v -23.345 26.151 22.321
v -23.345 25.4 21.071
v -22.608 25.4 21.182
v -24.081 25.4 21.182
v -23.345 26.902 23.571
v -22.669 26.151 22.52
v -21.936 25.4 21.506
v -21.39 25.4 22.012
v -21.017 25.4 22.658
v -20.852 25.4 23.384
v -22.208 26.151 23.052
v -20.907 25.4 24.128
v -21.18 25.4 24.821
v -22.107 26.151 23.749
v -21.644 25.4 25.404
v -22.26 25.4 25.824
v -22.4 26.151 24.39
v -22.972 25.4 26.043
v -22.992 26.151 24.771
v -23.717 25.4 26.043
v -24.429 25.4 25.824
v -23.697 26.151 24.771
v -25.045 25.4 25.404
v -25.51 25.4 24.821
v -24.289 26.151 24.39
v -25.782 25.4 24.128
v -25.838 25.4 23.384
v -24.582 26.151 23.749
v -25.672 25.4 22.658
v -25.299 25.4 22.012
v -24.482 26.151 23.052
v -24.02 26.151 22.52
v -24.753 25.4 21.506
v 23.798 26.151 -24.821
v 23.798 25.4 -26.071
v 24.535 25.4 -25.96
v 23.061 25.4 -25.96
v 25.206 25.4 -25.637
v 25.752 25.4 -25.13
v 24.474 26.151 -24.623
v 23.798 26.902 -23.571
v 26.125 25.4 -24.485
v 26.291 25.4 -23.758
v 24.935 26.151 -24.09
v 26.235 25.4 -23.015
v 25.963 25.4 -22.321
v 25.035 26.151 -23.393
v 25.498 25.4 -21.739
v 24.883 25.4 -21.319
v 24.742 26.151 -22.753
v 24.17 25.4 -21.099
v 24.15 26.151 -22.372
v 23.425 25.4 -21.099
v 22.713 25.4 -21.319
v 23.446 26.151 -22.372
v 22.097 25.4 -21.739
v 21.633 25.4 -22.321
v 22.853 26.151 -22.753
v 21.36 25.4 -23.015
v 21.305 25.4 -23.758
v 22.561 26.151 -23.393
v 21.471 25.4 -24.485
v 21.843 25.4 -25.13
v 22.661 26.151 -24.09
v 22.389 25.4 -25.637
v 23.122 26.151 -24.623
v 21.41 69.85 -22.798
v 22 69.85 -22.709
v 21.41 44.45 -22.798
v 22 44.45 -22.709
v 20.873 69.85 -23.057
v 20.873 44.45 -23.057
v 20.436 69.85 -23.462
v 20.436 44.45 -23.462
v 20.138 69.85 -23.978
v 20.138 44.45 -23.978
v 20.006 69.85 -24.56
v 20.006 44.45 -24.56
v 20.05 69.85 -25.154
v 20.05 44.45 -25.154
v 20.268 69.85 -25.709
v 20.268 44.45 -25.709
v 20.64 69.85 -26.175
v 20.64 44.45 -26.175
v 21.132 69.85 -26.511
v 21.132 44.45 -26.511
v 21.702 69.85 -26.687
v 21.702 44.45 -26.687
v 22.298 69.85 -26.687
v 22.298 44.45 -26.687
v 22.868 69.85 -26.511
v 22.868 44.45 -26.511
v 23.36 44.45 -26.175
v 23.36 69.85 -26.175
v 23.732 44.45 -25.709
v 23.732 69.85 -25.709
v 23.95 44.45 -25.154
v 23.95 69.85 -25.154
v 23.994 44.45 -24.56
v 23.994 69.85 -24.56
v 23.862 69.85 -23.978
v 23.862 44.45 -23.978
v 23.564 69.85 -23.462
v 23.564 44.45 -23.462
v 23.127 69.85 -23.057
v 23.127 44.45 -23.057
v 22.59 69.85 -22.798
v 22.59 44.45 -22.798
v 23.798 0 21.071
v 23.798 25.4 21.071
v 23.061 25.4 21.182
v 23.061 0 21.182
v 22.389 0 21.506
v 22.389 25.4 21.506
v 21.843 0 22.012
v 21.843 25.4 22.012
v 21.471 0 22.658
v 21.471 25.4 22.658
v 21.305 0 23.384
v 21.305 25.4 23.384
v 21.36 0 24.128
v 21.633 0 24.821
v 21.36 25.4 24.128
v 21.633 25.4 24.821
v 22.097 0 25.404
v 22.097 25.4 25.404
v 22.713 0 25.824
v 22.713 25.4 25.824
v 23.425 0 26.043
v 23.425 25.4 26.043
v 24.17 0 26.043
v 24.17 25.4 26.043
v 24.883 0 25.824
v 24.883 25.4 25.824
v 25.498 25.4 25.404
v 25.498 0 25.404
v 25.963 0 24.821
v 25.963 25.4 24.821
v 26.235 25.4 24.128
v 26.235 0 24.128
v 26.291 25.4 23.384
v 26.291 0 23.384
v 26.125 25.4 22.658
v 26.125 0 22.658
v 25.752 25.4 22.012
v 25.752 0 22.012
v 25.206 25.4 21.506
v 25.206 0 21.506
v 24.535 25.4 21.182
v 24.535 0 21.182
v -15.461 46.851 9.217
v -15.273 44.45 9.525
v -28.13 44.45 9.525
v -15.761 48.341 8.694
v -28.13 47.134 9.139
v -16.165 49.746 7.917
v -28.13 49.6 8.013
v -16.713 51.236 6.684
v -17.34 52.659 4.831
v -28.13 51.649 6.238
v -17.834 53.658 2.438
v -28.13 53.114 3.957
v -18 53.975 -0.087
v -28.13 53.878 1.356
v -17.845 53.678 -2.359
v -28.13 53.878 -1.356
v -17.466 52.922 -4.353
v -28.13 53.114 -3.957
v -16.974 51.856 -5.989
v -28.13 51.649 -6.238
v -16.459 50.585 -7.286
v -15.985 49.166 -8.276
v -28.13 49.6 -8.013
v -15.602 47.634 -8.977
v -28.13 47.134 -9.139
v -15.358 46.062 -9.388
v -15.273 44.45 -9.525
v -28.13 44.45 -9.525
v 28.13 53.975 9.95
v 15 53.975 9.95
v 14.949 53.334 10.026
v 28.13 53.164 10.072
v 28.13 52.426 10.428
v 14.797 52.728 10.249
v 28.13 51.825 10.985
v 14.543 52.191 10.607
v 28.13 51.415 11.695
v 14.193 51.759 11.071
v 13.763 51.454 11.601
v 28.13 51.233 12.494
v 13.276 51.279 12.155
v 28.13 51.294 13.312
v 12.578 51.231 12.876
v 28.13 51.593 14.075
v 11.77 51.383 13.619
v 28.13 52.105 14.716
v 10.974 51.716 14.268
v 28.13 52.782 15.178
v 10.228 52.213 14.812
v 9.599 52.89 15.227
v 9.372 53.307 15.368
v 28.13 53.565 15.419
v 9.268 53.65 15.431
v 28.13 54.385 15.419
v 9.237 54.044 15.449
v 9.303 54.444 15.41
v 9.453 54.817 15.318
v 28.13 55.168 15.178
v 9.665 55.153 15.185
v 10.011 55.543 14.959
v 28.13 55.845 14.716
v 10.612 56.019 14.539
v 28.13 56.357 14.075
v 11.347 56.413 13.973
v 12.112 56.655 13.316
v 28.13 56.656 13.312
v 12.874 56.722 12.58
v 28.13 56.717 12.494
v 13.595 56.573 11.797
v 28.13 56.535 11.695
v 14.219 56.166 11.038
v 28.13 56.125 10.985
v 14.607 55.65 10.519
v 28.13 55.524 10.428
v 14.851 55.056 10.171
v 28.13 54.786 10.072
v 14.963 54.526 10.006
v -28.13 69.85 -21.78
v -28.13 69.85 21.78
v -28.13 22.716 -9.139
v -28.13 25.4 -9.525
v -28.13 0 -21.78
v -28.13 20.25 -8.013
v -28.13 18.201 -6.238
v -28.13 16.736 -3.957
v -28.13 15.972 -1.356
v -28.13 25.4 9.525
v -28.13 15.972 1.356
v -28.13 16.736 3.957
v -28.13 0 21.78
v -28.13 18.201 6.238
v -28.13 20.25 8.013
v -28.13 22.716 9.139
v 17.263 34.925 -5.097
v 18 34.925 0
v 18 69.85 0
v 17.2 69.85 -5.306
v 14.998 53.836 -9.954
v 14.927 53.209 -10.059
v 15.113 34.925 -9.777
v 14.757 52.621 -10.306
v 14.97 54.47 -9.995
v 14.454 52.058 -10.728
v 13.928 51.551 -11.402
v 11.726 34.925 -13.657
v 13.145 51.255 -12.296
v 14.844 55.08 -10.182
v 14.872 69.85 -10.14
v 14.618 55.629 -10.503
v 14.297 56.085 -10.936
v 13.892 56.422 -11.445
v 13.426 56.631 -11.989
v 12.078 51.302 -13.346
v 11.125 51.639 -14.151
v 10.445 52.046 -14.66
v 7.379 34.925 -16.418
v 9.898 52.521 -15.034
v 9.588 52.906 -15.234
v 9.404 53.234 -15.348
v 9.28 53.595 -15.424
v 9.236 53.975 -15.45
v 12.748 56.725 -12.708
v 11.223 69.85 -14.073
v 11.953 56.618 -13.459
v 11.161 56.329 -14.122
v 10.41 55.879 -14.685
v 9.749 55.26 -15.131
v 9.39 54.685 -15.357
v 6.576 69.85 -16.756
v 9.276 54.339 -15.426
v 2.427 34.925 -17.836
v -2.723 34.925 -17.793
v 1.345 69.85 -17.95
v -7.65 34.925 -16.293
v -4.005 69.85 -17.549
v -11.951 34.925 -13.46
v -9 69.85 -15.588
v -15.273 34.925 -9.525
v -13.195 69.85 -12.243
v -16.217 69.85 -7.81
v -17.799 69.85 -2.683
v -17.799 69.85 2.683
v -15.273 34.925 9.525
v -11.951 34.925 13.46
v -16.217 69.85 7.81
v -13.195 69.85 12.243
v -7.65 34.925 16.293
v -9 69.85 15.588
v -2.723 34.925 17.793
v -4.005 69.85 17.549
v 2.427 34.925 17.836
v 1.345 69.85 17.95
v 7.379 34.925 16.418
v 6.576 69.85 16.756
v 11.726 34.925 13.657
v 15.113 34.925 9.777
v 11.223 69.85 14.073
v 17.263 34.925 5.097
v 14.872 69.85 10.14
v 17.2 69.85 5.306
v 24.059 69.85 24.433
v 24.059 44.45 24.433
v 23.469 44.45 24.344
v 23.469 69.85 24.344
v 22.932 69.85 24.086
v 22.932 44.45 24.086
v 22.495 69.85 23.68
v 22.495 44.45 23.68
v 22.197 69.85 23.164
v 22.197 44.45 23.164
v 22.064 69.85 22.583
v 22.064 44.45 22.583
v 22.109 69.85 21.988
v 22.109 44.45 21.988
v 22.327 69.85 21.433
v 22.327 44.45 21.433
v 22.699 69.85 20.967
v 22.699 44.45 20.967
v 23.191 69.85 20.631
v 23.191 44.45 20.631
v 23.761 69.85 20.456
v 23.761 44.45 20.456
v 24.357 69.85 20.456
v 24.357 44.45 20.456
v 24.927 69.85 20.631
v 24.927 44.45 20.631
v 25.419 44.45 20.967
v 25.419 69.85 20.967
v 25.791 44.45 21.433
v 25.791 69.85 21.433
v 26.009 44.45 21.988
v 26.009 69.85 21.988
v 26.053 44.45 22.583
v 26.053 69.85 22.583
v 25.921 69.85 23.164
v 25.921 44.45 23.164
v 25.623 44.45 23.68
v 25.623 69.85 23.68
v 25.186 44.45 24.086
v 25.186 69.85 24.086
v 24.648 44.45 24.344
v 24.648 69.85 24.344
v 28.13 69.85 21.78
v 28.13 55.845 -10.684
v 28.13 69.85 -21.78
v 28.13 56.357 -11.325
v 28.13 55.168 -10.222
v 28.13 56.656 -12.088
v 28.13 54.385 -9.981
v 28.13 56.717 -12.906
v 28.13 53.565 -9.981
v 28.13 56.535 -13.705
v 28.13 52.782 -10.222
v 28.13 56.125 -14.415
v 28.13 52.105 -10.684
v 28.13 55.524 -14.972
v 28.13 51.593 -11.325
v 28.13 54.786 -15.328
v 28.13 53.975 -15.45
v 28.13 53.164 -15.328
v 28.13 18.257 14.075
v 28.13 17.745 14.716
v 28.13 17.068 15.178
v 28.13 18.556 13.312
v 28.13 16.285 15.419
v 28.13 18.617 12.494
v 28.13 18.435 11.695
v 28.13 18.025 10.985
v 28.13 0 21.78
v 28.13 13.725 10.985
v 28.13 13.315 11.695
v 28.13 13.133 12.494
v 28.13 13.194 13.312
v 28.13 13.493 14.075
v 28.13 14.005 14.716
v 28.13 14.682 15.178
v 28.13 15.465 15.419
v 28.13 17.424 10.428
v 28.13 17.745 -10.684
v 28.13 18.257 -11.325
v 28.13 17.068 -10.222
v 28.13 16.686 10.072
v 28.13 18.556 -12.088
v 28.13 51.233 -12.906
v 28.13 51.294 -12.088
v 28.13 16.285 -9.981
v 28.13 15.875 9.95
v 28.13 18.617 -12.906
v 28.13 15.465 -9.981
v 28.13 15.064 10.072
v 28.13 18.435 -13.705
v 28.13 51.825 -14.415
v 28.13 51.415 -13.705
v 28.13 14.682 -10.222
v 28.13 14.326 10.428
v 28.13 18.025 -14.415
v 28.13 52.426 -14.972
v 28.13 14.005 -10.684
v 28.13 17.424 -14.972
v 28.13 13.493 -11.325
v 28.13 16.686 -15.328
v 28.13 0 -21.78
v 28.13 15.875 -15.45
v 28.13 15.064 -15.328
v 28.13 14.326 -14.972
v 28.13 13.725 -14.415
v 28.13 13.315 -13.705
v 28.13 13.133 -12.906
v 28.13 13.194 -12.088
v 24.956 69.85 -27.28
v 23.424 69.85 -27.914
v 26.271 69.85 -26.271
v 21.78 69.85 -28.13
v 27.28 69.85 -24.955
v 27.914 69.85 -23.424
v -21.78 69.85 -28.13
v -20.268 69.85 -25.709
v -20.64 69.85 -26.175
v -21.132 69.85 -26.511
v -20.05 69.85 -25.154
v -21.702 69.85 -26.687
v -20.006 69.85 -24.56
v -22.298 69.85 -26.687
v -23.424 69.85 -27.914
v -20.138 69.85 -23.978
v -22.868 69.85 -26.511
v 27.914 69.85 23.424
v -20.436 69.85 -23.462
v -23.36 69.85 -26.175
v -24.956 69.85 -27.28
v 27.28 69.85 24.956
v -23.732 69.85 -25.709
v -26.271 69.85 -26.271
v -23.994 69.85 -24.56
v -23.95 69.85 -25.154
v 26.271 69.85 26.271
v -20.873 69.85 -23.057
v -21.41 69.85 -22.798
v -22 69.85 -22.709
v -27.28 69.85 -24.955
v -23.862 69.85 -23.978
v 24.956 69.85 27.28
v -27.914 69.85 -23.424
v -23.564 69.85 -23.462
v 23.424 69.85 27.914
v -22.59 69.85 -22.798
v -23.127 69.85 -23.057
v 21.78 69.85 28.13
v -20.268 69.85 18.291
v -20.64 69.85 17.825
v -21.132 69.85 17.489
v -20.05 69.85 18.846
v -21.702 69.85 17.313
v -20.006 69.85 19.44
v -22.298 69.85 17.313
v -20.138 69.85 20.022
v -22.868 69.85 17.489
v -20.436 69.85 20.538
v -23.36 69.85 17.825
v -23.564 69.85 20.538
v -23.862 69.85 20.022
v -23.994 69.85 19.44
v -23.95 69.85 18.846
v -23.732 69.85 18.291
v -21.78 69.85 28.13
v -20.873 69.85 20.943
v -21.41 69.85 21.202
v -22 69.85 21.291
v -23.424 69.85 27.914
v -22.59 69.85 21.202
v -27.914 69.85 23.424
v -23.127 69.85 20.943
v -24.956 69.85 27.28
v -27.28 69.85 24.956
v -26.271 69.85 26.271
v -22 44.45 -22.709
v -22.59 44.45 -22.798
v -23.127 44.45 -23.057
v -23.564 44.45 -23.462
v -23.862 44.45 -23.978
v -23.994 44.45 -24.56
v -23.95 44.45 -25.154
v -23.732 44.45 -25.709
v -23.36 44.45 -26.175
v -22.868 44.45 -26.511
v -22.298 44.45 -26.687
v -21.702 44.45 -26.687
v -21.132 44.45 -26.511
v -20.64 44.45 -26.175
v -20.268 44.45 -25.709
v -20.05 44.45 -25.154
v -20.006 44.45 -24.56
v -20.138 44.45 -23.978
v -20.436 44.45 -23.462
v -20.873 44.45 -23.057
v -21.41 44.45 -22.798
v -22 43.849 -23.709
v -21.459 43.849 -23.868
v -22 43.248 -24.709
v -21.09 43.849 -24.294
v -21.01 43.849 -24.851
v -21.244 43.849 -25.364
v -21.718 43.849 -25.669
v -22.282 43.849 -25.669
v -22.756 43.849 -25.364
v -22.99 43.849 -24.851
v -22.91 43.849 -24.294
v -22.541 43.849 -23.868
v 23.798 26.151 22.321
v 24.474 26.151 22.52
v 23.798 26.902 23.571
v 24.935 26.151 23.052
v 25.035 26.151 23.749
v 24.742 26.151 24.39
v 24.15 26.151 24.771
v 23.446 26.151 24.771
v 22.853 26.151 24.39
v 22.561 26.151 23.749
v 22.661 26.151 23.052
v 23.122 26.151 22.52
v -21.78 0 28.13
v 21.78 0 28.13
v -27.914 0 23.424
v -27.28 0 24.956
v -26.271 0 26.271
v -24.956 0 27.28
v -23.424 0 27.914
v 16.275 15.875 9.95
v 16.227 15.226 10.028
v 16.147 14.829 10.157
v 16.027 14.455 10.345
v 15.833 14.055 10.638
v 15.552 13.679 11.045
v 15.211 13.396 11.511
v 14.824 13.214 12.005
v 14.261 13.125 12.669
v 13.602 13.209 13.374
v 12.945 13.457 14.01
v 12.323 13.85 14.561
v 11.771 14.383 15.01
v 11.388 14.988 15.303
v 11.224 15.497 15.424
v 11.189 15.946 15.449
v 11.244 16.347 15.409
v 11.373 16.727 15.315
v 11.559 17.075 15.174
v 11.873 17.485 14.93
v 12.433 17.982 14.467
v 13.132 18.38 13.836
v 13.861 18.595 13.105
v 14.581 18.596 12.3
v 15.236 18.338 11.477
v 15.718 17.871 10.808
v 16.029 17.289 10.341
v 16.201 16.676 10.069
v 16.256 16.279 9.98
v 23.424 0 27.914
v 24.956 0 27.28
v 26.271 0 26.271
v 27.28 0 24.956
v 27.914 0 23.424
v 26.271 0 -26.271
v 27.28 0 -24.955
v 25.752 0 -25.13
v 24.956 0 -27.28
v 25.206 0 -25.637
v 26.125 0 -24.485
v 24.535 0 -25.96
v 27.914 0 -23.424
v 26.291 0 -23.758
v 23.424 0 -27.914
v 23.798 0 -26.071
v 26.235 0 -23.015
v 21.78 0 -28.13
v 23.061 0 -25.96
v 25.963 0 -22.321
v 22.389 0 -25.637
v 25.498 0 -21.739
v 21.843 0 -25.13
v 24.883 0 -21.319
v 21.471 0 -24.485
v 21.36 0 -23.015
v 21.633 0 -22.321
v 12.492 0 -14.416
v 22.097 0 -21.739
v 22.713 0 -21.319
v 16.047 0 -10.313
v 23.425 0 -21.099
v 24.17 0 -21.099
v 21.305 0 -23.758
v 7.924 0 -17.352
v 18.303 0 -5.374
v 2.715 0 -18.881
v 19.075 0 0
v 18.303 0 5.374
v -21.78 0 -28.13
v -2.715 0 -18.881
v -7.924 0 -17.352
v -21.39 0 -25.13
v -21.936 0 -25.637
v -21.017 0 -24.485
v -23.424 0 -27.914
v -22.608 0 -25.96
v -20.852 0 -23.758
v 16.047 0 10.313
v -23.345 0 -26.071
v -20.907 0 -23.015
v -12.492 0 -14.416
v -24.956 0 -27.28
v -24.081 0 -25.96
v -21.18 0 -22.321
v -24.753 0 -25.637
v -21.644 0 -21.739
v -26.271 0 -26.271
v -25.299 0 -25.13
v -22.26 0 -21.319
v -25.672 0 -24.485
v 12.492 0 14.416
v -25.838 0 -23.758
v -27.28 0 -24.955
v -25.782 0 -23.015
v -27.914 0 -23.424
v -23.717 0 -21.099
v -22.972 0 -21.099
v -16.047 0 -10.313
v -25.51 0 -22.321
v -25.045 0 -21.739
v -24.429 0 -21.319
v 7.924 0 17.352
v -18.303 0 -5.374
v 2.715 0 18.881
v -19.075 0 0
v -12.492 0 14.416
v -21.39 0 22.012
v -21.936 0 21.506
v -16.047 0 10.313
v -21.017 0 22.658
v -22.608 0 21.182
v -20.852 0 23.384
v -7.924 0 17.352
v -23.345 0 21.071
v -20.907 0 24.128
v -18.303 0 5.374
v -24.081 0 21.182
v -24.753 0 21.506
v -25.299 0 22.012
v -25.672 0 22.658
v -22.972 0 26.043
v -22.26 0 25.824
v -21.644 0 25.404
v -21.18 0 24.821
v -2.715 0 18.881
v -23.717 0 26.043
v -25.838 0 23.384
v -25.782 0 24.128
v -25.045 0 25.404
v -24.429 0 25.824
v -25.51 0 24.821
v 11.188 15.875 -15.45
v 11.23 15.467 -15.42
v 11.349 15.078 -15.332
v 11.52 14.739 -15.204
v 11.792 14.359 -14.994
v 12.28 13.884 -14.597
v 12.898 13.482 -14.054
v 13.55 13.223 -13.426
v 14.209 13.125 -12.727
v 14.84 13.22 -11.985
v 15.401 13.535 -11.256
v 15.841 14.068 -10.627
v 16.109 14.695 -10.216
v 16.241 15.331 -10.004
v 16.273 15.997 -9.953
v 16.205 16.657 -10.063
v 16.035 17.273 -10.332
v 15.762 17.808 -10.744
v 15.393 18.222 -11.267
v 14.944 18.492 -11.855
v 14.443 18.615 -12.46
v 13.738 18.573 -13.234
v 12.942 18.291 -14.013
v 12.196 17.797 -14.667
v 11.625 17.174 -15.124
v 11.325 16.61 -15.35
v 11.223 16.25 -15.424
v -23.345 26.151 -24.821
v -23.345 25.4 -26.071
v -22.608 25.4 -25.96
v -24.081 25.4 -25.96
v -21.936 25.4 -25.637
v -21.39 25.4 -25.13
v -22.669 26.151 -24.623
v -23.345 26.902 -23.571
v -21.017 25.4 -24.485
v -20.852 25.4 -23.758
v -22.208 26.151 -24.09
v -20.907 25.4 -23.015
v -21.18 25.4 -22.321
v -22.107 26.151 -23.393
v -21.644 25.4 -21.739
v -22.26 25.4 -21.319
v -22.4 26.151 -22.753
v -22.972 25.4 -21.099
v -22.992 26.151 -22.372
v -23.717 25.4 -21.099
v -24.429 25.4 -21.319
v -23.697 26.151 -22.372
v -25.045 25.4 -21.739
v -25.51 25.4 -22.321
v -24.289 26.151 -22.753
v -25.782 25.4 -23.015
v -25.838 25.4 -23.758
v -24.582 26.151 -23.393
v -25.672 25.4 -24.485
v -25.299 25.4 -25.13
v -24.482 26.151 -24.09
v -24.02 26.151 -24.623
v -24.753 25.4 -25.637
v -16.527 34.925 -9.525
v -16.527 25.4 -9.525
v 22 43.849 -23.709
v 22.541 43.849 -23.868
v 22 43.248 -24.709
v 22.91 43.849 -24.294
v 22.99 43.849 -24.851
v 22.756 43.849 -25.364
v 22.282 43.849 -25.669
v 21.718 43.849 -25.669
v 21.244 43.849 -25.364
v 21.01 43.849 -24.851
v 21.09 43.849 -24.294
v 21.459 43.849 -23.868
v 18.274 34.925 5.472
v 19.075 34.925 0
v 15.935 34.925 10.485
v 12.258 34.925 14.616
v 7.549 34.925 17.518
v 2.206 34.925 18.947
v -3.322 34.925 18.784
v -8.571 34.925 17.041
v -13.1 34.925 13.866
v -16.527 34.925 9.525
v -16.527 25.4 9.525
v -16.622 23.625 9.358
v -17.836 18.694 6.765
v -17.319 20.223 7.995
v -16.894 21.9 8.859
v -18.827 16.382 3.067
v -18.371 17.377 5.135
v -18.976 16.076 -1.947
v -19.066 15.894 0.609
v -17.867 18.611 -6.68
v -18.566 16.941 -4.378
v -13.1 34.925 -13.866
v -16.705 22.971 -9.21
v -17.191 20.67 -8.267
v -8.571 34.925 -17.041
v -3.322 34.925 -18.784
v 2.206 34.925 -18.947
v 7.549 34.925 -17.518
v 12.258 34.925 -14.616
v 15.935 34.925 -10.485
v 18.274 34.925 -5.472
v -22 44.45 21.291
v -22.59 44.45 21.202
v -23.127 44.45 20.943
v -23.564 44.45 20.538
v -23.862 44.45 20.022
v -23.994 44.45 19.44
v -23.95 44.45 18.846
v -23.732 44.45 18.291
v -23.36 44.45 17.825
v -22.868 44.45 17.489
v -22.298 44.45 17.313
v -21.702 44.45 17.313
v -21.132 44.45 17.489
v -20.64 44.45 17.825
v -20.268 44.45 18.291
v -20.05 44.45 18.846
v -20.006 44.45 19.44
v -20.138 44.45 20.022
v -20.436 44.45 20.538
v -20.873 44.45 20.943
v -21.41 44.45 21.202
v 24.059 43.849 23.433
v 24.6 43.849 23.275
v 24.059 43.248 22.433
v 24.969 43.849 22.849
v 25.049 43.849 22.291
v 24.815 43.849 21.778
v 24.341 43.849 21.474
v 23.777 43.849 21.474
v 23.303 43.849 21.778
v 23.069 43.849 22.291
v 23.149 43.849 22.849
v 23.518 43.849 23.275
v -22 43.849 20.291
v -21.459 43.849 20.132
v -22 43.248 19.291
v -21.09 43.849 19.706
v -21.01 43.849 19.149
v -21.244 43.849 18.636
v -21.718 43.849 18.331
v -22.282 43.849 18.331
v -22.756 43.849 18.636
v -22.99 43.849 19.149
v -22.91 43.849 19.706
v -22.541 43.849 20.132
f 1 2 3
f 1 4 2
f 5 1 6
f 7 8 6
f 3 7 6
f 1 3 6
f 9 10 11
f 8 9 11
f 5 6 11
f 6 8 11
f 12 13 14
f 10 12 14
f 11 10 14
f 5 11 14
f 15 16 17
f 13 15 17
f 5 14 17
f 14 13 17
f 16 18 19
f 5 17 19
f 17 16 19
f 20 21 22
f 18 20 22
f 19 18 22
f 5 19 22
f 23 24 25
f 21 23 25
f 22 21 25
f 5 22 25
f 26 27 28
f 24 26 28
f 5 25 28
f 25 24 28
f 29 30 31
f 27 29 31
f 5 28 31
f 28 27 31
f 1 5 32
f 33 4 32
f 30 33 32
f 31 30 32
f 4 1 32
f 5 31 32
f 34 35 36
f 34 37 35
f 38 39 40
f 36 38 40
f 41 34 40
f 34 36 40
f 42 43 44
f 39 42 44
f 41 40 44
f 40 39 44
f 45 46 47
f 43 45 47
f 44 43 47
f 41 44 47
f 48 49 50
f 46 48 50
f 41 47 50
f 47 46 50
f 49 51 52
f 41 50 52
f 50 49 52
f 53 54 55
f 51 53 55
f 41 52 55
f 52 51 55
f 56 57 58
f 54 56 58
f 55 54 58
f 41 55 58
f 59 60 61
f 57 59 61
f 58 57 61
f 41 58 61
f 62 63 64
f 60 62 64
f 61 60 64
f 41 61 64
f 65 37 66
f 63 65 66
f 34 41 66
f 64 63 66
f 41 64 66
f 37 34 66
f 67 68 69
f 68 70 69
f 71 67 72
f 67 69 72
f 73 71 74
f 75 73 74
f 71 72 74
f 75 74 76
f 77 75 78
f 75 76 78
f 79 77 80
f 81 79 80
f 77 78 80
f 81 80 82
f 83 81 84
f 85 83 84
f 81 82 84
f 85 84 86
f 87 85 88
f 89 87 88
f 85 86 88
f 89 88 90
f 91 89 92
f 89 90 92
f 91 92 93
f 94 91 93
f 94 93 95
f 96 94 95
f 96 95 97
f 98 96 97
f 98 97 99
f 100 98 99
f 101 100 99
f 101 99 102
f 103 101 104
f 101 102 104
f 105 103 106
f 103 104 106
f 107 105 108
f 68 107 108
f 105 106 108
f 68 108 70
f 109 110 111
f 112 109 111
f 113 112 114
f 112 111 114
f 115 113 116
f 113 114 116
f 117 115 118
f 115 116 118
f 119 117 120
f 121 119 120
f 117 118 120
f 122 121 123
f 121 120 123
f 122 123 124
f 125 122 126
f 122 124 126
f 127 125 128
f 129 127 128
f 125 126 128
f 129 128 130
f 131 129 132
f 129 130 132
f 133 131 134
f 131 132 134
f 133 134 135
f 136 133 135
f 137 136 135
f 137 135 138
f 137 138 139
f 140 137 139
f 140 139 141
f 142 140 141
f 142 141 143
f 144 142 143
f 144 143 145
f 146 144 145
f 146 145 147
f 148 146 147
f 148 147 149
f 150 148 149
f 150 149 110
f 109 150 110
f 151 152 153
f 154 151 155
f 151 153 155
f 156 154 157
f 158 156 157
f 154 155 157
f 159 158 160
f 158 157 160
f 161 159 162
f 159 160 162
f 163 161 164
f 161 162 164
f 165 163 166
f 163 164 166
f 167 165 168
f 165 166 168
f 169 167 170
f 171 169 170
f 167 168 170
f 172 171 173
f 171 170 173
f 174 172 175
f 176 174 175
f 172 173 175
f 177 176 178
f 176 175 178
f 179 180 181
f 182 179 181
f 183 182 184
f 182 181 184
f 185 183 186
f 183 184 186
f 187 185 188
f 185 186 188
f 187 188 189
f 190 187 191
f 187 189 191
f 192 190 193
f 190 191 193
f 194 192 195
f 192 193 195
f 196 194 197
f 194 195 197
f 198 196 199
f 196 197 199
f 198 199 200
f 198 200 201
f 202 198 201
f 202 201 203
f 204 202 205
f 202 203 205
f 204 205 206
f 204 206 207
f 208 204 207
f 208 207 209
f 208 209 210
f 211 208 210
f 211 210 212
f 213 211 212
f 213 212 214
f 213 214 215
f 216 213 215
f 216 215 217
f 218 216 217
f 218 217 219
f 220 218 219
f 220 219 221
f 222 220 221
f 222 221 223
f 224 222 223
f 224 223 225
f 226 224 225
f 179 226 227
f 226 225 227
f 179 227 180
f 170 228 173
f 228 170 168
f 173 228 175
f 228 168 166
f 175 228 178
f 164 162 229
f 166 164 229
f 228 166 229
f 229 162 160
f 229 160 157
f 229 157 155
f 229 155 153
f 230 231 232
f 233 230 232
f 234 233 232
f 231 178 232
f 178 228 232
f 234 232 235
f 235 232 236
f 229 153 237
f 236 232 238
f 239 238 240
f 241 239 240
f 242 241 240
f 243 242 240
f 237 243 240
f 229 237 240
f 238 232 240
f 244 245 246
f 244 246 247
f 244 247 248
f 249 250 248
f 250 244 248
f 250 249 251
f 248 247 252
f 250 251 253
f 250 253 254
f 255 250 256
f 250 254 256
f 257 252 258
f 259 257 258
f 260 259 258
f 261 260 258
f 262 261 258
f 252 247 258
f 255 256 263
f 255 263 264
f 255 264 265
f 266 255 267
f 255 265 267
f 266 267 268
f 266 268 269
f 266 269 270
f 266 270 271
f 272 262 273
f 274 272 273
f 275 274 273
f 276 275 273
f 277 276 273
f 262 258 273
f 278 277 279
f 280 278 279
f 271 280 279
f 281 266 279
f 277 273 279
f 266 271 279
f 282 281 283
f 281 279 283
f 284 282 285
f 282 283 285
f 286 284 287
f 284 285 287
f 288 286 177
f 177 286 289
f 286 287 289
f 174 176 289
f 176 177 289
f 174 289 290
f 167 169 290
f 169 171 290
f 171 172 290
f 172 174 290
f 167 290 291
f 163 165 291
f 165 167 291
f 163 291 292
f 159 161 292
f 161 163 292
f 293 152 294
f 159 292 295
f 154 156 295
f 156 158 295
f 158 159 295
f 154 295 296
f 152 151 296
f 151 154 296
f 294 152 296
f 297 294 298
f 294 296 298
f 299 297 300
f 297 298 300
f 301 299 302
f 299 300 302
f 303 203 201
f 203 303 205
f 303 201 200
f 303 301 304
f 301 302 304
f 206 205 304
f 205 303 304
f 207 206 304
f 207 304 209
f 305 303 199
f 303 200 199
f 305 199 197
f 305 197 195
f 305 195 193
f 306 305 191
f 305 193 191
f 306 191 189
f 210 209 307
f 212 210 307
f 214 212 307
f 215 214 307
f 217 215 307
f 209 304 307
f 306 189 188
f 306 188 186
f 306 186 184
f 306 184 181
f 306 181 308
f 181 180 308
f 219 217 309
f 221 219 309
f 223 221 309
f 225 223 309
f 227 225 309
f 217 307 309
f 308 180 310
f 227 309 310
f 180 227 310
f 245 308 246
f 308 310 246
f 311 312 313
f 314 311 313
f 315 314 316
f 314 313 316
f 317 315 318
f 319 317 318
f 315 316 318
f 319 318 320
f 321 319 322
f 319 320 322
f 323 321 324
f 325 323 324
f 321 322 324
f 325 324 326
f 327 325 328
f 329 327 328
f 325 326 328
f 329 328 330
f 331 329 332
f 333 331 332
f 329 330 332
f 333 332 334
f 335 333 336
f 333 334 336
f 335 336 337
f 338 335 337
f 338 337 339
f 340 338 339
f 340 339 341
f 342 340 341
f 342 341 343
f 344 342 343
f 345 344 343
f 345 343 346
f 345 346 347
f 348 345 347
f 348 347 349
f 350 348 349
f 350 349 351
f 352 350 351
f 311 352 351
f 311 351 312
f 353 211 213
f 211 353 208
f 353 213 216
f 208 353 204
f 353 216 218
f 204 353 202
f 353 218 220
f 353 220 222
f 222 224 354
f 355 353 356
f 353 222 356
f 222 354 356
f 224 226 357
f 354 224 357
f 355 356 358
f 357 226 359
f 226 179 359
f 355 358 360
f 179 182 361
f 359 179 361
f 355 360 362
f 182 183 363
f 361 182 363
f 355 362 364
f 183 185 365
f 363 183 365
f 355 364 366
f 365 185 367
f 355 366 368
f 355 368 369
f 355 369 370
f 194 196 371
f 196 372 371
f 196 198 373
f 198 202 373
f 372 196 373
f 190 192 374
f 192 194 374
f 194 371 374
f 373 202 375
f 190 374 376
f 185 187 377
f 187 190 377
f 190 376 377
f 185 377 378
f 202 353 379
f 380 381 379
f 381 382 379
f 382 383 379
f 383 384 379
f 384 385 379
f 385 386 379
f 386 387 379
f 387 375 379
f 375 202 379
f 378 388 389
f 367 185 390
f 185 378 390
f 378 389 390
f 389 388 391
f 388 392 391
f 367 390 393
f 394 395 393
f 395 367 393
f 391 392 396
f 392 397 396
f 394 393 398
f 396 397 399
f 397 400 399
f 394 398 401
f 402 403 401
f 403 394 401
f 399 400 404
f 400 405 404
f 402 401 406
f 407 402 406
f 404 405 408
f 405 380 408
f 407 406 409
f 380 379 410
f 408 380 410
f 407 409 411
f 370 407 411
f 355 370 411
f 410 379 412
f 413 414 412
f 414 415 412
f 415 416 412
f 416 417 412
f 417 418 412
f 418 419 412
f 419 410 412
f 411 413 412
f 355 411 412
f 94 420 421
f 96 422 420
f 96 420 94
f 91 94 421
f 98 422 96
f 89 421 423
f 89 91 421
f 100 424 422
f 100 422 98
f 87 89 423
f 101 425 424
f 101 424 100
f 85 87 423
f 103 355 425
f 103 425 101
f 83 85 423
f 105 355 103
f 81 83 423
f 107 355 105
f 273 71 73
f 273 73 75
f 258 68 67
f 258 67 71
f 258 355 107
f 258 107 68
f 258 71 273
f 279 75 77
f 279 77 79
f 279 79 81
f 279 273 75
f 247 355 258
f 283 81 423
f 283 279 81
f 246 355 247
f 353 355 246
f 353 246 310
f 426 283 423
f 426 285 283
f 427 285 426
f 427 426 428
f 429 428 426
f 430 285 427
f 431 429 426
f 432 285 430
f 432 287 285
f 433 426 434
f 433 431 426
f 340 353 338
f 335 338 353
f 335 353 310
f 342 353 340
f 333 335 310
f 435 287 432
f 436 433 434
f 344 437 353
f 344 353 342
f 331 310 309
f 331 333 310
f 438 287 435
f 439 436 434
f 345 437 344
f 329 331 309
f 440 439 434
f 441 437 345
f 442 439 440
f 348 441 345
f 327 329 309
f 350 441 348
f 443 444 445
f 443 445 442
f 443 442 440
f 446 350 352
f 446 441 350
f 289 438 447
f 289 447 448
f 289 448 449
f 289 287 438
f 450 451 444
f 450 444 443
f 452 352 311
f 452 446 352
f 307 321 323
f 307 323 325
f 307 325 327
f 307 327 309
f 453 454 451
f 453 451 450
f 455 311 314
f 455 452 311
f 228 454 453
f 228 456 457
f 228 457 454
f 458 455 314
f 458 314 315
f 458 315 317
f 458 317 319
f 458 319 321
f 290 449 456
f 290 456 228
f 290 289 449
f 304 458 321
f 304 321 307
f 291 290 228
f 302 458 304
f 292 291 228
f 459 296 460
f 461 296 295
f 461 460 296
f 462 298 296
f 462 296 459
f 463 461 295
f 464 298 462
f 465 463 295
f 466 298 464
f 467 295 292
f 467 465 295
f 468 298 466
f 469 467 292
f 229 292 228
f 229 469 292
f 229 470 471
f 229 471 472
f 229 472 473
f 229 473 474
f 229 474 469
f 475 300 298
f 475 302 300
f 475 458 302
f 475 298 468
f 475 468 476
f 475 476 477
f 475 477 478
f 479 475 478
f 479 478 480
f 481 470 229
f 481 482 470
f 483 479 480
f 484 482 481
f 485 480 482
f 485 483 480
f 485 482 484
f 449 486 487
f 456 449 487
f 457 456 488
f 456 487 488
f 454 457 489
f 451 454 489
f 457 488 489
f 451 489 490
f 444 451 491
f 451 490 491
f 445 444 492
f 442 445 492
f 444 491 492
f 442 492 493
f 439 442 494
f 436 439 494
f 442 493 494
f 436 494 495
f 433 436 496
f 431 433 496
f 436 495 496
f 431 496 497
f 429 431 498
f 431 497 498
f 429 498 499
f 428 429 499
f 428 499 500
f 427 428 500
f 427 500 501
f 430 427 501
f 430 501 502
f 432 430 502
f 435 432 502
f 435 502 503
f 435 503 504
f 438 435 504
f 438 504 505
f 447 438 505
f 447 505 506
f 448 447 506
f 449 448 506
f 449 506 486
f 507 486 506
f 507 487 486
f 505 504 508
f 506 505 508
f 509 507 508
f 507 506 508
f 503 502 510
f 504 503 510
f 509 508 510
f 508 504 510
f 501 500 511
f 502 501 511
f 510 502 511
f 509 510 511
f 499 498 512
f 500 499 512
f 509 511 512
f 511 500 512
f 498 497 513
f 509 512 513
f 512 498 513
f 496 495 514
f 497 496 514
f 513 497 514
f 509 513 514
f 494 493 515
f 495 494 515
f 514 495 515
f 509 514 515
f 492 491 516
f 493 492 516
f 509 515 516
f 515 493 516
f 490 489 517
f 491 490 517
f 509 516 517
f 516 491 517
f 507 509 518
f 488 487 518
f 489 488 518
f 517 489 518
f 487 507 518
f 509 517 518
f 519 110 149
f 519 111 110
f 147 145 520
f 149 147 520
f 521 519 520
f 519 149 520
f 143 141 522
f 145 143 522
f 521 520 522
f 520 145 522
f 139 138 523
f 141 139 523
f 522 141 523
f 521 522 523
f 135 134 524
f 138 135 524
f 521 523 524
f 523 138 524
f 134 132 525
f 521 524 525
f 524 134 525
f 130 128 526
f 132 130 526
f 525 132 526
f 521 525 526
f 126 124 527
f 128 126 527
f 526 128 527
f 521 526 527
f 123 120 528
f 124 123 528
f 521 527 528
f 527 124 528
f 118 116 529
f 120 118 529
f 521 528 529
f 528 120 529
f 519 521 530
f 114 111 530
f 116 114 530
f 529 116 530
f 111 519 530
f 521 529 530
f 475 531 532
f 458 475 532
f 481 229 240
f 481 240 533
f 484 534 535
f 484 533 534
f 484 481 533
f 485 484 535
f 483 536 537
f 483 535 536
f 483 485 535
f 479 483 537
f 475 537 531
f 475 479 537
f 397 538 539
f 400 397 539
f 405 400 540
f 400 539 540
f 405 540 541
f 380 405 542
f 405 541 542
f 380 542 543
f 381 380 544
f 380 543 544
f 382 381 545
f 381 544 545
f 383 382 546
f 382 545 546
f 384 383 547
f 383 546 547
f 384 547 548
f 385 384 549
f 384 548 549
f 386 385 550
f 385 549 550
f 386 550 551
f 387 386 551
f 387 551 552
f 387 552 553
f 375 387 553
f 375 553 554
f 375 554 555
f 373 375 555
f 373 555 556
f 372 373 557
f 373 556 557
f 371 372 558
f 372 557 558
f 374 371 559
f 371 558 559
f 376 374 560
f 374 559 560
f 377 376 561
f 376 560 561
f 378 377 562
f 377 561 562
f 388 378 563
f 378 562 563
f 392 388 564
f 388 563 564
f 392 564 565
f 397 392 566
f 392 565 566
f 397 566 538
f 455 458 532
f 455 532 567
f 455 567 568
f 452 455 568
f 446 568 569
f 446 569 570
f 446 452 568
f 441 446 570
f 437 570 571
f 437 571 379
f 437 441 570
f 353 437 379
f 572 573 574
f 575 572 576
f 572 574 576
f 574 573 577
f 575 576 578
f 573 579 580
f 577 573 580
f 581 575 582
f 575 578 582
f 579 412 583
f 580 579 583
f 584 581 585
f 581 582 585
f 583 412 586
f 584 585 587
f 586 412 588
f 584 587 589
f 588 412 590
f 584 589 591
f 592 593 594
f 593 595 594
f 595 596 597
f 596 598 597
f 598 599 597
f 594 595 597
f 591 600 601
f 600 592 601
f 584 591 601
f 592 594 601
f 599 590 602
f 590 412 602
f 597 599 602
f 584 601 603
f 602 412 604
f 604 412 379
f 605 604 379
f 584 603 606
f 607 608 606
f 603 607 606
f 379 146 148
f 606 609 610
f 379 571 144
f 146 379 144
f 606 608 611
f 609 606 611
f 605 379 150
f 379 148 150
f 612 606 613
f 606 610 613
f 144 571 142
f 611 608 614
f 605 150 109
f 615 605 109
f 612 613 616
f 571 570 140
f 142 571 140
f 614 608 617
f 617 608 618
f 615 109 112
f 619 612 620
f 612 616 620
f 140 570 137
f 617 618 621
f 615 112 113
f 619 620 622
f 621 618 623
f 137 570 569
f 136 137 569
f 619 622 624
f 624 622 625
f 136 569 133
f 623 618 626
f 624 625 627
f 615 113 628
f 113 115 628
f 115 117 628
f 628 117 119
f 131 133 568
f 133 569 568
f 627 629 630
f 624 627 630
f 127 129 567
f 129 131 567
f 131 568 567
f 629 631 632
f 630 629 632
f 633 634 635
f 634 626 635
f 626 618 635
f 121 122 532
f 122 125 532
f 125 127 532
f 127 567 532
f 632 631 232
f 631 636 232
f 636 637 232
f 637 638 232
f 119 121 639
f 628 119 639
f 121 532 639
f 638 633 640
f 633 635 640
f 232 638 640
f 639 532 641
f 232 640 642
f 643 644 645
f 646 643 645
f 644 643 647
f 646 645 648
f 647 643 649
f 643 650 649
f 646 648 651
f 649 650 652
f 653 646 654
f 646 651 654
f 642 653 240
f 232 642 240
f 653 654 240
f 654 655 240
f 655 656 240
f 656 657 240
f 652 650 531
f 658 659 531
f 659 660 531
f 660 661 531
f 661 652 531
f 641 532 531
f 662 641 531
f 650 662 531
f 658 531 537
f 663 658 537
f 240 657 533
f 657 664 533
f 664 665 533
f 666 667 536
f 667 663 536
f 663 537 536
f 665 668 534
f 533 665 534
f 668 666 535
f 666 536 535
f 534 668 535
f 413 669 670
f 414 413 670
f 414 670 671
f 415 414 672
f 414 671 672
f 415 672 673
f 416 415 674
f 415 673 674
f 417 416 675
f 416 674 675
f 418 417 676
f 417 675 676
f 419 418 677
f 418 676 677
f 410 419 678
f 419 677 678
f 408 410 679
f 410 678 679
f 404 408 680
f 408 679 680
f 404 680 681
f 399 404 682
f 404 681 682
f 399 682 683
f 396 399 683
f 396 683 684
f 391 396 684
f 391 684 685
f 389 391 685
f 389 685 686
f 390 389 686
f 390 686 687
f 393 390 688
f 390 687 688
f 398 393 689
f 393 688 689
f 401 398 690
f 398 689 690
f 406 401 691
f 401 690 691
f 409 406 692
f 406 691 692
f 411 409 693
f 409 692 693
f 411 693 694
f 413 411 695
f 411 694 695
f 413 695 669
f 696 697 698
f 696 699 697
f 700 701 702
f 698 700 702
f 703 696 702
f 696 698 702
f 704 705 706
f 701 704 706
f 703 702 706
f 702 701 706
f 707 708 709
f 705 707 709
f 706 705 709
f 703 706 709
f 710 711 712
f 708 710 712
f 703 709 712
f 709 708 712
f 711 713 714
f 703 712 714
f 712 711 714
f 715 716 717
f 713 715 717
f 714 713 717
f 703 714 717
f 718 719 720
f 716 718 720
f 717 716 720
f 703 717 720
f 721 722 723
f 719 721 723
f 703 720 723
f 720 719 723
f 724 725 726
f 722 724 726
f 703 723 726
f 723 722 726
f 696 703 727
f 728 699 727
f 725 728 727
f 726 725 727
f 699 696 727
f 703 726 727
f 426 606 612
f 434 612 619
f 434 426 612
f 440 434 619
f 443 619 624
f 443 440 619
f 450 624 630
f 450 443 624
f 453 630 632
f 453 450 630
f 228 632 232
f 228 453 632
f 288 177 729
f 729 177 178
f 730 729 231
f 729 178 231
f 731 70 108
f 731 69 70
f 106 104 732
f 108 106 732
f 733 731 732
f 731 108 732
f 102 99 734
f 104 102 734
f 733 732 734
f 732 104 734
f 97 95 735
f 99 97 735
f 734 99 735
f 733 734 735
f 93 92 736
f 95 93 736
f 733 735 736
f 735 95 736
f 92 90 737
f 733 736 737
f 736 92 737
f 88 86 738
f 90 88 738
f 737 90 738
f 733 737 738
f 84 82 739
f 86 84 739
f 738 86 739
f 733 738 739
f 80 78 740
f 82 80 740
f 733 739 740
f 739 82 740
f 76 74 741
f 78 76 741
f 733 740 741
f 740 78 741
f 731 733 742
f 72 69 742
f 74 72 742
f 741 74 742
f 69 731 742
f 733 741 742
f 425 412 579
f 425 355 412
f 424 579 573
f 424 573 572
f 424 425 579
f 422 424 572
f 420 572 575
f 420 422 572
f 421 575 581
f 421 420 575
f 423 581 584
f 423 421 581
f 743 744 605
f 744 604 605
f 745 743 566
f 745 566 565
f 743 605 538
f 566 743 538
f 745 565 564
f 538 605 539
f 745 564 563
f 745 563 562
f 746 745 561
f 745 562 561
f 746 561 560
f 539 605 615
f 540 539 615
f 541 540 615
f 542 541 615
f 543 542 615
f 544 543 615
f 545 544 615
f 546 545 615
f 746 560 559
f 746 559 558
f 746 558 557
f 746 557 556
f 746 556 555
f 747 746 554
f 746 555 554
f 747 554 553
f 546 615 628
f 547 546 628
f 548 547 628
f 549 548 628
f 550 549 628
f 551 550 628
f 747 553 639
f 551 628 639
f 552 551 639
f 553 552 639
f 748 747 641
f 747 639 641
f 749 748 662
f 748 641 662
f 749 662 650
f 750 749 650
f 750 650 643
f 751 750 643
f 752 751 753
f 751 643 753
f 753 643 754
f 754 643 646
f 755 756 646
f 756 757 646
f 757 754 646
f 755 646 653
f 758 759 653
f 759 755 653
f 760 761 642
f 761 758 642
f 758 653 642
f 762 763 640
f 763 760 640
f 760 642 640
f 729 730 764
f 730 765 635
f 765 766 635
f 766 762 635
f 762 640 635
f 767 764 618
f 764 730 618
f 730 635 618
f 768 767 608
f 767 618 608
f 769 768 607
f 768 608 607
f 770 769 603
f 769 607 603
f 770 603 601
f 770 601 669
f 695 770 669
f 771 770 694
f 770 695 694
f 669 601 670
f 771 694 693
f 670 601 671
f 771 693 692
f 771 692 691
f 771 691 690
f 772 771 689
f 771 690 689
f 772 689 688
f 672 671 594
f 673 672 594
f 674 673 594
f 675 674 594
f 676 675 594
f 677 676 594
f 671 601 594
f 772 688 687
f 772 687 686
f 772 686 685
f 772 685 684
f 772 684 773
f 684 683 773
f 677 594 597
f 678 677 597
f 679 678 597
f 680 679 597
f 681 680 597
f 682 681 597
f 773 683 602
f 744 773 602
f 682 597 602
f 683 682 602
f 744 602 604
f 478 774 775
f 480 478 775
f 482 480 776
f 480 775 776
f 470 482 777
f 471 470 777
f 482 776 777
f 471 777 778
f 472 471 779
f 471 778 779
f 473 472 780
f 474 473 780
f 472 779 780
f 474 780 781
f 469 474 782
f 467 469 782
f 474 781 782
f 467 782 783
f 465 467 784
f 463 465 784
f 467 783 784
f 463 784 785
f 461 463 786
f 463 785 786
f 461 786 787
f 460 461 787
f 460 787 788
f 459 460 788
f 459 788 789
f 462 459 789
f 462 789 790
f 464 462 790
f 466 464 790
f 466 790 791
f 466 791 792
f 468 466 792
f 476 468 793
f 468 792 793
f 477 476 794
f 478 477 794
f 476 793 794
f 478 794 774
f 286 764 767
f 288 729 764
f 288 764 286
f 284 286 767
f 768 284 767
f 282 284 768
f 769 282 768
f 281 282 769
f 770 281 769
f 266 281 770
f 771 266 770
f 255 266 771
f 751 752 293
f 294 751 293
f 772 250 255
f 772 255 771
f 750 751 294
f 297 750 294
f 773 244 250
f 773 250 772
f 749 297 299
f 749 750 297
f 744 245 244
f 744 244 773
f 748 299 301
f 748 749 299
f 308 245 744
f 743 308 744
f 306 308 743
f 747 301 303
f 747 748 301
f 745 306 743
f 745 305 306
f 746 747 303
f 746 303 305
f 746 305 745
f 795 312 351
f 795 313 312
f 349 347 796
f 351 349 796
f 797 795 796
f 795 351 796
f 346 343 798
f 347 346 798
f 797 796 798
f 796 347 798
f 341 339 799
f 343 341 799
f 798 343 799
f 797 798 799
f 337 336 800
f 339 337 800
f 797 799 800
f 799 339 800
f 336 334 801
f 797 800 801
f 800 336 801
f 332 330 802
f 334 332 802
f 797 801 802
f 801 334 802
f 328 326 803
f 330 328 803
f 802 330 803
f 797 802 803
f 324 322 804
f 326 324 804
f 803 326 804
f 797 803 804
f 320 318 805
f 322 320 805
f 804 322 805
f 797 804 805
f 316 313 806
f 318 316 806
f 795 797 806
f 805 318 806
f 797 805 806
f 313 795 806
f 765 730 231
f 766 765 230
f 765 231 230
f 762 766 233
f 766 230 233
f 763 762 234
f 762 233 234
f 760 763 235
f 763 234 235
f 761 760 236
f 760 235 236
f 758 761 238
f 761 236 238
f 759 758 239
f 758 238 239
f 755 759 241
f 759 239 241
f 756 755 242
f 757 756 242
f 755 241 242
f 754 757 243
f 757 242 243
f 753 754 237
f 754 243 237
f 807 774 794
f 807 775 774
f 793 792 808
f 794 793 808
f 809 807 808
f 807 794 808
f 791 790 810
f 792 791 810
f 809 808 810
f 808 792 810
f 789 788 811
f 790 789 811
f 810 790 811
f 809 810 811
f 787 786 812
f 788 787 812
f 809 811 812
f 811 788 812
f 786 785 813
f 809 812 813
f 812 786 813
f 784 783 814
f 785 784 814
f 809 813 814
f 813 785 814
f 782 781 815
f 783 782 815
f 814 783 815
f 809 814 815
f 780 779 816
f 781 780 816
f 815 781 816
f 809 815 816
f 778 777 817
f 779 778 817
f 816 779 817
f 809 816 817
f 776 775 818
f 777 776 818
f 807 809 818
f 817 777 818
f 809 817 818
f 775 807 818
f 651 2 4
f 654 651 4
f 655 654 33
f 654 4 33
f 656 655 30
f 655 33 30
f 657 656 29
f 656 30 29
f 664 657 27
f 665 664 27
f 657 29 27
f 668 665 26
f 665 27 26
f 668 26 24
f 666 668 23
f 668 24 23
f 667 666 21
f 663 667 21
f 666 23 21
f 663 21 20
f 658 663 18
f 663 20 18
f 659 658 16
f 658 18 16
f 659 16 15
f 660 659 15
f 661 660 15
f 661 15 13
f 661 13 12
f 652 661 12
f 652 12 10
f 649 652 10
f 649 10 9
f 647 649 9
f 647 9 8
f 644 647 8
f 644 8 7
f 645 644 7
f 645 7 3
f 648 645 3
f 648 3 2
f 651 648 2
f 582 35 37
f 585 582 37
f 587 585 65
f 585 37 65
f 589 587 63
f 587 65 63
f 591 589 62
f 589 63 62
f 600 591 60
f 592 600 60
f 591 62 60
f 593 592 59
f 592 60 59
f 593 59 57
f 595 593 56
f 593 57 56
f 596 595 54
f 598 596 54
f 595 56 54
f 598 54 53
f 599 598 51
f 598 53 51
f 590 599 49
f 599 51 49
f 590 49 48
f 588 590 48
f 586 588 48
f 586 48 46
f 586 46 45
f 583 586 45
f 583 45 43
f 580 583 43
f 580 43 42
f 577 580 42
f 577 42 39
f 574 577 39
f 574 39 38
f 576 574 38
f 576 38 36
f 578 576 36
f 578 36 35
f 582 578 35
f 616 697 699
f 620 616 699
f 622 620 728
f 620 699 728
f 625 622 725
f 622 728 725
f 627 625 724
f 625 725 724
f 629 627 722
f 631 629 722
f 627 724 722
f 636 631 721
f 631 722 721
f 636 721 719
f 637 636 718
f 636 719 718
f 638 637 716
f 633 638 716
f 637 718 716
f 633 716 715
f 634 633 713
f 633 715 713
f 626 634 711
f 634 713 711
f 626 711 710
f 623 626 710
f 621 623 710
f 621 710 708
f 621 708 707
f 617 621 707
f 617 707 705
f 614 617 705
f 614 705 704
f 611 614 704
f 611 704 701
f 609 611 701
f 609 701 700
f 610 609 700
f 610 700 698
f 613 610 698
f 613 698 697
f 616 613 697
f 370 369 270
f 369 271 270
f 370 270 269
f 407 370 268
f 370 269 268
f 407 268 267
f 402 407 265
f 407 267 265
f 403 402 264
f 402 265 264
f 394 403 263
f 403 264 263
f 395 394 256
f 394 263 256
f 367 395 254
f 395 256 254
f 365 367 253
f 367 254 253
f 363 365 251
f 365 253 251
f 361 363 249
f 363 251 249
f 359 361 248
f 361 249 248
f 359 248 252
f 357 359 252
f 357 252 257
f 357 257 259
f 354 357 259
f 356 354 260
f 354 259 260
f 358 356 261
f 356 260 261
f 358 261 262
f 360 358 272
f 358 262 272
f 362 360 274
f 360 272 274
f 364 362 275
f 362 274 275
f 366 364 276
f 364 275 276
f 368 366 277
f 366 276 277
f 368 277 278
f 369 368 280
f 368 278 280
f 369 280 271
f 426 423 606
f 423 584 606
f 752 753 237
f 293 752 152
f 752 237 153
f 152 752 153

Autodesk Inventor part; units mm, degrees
ref_plane "YZ Plane" through (0, 0, 0) normal (1, 0, 0) x (0, 1, 0)
ref_plane "XZ Plane" through (0, 0, 0) normal (0, 1, 0) x (-1, 0, 0)
ref_plane "XY Plane" through (0, 0, 0) normal (0, 0, 1) x (1, 0, 0)
sketch "Sketch1" plane through (0, 0, 0) normal (0, 1, 0) x (-1, 0, 0)
  line L0 (28.1305, 28.1305) -> (-28.1305, 28.1305)
  line L1 (-28.1305, 28.1305) -> (-28.1305, -28.1305)
  line L2 (-28.1305, -28.1305) -> (28.1305, -28.1305)
  line L3 (28.1305, -28.1305) -> (28.1305, 28.1305)
  line L4 (28.1305, 28.1305) -> (-28.1305, -28.1305) construction
  line L5 (-28.1305, 28.1305) -> (28.1305, -28.1305) construction
  point P0 (0, 0)
  dimension "d0" = 56.261
  dimension "d1" = 56.261
extrude "Extrusion1" add sketch "Sketch1" along normal blind 69.85
sketch "Sketch2" plane through (0, 69.85, 0) normal (0, 1, 0) x (1, 0, 0)
  circle A0 centre (0, 0) radius 18
  point P0 (-22, 24.7091)
  point P1 (22, 24.7091)
  point P2 (24.0589, -22.4333)
  point P3 (-22, -19.2909)
  dimension "d4" = 44
  dimension "d5" = 44
  dimension "d6" = 22
  dimension "d7" = 36
hole "Hole1" at (-22, 69.85, -24.7091) at (22, 69.85, -24.7091) at (24.0589, 69.85, 22.4333) at (-22, 69.85, 19.2909) direction (0, -1, 0) diameter 4 depth 25.4 tip angle 118
sketch "Sketch3" plane through (0, 69.85, 0) normal (0, 1, 0) x (1, 0, 0)
  circle A0 centre (0, 0) radius 18
  dimension "d15" = 36
extrude "Extrusion2" cut sketch "Sketch3" against normal blind 254
sketch "Sketch4" plane through (0, 0, 0) normal (0, -1, 0) x (1, 0, 0)
  circle A0 centre (0, 0) radius 18 projected
  point P0 (-23.3446, 23.5712)
  point P1 (23.7978, 23.5712)
  point P2 (23.7978, -23.5712)
  point P3 (-23.3446, -23.5712)
  dimension "d18" = 47.1424
  dimension "d19" = 47.1424
  dimension "d20" = 23.5712
hole "Hole2" at (-23.3446, 0, 23.5712) at (23.7978, 0, 23.5712) at (23.7978, 0, -23.5712) at (-23.3446, 0, -23.5712) direction (0, 1, 0) diameter 5 depth 25.4 tip angle 118
sketch "Sketch5" plane through (0, 0, 0) normal (0, -1, 0) x (1, 0, 0)
  circle A0 centre (0, 0) radius 18 projected
  circle A1 centre (0, 0) radius 19.0754
  dimension "d28" = 38.1508
extrude "Extrusion3" cut sketch "Sketch5" against normal blind 34.925
fillet "Fillet1" radius 6.35 1 edges at (28.1305, 34.925, 28.1305)
fillet "Fillet2" radius 6.35 1 edges at (-28.1305, 34.925, 28.1305)
fillet "Fillet3" radius 6.35 1 edges at (28.1305, 34.925, -28.1305)
fillet "Fillet4" radius 6.35 1 edges at (-28.1305, 34.925, -28.1305)
sketch "Sketch6" plane through (-28.1305, 0, 21.7805) normal (-1, 0, 0) x (0, 0, 1)
  line L0 (-49.911, 0) -> (0, 0) projected
  line L1 (0, 69.85) -> (0, 0) projected
  line L2 (-31.3055, 25.4) -> (-12.2555, 25.4) construction
  line L3 (-12.2555, 25.4) -> (-12.2555, 44.45)
  line L4 (-12.2555, 44.45) -> (-31.3055, 44.45) construction
  line L5 (-31.3055, 44.45) -> (-31.3055, 25.4)
  line L6 (-31.3055, 25.4) -> (-12.2555, 44.45) construction
  line L7 (-12.2555, 25.4) -> (-31.3055, 44.45) construction
  arc A0 (-12.2555, 44.45) -> (-31.3055, 44.45) centre (-21.7805, 44.45) ccw
  arc A1 (-31.3055, 25.4) -> (-12.2555, 25.4) centre (-21.7805, 25.4) ccw
  point P0 (-43.561, 0)
  point P1 (-21.7805, 0)
  point P2 (-21.7805, 34.925)
  point P3 (-21.7805, 34.925)
  point P4 (-21.7805, 0)
  point P5 (0, 34.925)
  point P6 (-21.7805, 53.975)
  point P7 (-21.7805, 15.875)
  dimension "d35" = 19.05
  dimension "d36" = 19.05
extrude "Extrusion4" cut sketch "Sketch6" against normal blind 25.4
sketch "Sketch7" plane through (28.1305, 0, 21.7805) normal (1, 0, 0) x (0, 0, -1)
  line L0 (0, 0) -> (0, 69.85) projected
  line L1 (0, 0) -> (49.911, 0) projected
  line L2 (9.0805, 15.875) -> (34.4805, 15.875) construction
  line L3 (34.4805, 15.875) -> (34.4805, 53.975) construction
  line L4 (34.4805, 53.975) -> (9.0805, 53.975) construction
  line L5 (9.0805, 53.975) -> (9.0805, 15.875) construction
  line L6 (9.0805, 15.875) -> (34.4805, 53.975) construction
  line L7 (34.4805, 15.875) -> (9.0805, 53.975) construction
  line L8 (0, 69.85) -> (49.911, 69.85) projected
  point P0 (43.561, 0)
  point P1 (21.7805, 0)
  point P2 (21.7805, 34.925)
  point P3 (21.7805, 0)
  point P4 (0, 34.925)
  point P5 (43.561, 69.85)
  dimension "d39" = 25.4
  dimension "d40" = 38.1
  dimension "d48" = 15.875
hole "Hole3" at (28.1305, 53.975, 12.7) at (28.1305, 53.975, -12.7) at (28.1305, 15.875, -12.7) at (28.1305, 15.875, 12.7) direction (-1, 0, 0) diameter 5.5 depth 25.4 tip angle 118
equation "\"d5\" = d4"
equation "\"d6\" = 0.5 * d4"
equation "\"d19\" = d18"
equation "\"d20\" = 0.5 * d18"
properties part number "nema23_motor_mount"
